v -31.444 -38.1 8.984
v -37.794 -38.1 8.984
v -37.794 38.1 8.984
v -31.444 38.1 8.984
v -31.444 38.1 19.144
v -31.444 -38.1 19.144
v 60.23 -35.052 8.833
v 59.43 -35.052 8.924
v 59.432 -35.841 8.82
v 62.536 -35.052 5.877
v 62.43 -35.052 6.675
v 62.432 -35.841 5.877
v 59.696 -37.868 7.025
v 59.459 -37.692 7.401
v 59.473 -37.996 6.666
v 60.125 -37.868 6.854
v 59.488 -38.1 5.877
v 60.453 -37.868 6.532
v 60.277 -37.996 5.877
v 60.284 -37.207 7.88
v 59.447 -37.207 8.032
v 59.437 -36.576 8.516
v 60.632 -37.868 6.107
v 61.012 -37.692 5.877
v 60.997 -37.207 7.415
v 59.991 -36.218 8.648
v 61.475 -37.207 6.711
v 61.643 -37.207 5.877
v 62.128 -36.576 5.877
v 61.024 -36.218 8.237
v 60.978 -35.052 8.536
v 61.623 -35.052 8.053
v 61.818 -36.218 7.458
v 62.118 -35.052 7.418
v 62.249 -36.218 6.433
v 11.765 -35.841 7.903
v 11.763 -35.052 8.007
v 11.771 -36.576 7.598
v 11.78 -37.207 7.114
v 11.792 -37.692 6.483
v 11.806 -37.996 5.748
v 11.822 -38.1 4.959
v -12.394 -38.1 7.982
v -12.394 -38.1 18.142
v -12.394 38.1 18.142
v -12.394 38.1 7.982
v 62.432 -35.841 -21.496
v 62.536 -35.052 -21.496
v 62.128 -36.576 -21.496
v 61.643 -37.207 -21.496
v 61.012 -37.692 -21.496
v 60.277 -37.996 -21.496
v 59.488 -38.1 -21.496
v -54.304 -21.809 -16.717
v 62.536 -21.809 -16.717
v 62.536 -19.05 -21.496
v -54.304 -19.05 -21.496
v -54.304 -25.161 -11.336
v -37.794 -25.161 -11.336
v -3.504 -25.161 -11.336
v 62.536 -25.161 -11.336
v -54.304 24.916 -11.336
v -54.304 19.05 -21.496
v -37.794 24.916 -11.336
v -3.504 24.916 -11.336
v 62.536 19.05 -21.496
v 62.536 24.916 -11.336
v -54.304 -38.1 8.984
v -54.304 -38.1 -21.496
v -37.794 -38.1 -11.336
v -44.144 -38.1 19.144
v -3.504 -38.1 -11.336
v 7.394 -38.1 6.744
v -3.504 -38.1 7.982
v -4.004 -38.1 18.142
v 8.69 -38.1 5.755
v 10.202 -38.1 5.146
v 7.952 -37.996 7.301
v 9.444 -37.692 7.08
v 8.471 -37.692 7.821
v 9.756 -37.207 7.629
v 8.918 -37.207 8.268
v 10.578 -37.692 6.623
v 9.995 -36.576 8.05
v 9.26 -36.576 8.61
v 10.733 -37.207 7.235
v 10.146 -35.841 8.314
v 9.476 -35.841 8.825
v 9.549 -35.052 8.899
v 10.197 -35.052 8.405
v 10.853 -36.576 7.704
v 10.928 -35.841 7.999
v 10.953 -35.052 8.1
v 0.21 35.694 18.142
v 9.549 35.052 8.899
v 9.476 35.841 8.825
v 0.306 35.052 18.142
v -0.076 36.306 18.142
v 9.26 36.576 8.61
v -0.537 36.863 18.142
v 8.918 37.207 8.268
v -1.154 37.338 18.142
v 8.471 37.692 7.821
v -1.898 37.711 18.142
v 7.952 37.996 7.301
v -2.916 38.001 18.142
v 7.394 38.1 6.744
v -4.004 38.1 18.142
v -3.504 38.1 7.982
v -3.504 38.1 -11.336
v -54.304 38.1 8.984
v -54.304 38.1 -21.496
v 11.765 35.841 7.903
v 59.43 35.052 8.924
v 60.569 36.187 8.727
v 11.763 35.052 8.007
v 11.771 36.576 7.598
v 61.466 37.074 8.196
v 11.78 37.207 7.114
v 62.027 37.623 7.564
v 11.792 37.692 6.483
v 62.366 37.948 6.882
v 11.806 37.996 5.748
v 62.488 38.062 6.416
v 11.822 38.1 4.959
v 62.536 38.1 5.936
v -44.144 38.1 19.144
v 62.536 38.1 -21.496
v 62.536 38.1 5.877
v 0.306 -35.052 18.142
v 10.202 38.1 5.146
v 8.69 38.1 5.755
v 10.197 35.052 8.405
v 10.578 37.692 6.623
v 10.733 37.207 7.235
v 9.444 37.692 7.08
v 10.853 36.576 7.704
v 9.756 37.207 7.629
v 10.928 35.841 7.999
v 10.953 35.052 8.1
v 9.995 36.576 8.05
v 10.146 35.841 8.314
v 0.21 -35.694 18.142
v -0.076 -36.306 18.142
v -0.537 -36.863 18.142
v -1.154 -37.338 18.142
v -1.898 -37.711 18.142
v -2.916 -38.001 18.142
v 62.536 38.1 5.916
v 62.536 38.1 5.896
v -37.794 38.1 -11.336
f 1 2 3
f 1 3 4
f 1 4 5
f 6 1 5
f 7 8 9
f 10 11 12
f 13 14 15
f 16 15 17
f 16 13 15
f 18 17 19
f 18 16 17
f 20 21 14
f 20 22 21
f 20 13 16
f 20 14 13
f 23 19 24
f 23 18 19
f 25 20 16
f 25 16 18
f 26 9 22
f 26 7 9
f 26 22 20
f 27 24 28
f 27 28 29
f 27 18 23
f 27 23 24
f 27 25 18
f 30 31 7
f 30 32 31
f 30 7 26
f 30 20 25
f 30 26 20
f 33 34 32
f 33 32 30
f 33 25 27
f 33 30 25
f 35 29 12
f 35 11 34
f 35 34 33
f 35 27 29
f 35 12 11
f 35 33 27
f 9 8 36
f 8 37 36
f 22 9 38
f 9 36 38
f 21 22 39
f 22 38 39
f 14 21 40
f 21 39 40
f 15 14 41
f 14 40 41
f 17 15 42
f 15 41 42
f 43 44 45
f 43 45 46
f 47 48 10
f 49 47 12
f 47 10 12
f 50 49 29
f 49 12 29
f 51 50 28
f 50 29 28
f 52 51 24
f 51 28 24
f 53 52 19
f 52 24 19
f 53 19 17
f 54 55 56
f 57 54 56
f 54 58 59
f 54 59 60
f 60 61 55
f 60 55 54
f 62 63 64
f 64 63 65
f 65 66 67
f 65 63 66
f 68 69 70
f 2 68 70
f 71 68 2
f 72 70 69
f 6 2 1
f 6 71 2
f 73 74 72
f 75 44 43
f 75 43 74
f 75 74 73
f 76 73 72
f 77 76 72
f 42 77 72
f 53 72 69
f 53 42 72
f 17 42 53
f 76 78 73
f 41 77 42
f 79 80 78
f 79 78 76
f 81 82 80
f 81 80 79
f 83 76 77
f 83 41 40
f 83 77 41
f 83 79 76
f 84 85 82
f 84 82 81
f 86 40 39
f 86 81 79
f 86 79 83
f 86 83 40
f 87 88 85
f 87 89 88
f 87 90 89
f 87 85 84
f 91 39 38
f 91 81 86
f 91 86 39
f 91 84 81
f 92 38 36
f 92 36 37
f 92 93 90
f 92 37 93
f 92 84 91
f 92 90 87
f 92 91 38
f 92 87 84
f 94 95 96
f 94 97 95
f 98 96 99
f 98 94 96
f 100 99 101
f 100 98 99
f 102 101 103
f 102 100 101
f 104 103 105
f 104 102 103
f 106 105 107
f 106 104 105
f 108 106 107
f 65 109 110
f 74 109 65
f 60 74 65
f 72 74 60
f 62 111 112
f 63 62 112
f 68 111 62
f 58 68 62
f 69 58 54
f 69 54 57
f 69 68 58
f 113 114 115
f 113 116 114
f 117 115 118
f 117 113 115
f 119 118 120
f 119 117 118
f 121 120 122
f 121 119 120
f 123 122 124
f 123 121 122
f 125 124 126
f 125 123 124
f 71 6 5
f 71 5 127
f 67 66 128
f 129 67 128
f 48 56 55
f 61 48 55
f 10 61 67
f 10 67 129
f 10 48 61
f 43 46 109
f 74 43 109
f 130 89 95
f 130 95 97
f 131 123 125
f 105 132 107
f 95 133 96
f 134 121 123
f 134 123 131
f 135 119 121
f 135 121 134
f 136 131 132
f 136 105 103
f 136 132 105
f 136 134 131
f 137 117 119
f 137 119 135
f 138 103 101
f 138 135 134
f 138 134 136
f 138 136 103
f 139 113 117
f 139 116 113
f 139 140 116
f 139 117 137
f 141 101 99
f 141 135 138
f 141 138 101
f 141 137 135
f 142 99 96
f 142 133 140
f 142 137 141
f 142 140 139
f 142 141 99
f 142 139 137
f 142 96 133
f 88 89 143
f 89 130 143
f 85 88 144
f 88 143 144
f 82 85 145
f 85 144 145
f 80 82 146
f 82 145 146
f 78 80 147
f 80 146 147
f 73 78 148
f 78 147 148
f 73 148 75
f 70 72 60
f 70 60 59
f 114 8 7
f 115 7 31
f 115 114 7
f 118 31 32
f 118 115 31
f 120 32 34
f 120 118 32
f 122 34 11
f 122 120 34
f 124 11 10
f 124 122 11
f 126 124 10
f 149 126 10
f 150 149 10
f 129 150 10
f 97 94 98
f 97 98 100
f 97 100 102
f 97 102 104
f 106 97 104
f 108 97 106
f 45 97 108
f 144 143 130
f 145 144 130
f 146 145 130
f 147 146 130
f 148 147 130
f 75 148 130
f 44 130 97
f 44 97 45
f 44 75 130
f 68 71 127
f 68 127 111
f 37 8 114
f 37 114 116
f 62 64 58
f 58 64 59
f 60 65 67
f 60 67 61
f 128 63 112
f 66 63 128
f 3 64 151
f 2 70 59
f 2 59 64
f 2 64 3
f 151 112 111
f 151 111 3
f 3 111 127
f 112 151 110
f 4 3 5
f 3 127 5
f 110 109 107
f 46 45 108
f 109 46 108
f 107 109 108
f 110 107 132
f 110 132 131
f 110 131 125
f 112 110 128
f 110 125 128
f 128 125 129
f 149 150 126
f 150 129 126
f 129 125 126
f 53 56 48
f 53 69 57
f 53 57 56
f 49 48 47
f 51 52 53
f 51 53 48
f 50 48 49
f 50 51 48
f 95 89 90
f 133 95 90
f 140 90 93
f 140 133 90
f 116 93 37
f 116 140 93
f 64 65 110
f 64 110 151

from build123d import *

# Parameters (mm, degrees)
F1_DEPTH = 38.1
F2_R     = 3.048
F4_DEPTH = 116.84


with BuildPart() as f1:
    # F0 (on Front) → F1 (new body, symmetric)
    with BuildSketch(Plane.XZ):
        Polygon((0.306206, 7.981648), (10.466206, 7.981648), (0.306206, 18.141648), align=None)
        Polygon((-54.303794, -21.495858), (62.536206, -21.495858), (62.536206, 8.984142), (10.466206, 7.981648), (0.306206, 7.981648), (0.306206, 18.141648), (-12.393794, 18.141648), (-12.393794, 7.981648), (-3.503794, 7.981648), (-3.503794, -11.335858), (-37.793794, -11.335858), (-37.793794, 8.984142), (-31.443794, 8.984142), (-31.443794, 19.144142), (-44.143794, 19.144142), (-54.303794, 8.984142), align=None)
    extrude(amount=F1_DEPTH, both=True)

    # F2
    f2_edges = [f1.edges().sort_by_distance(p)[0] for p in [
        (5.386206, -38.1, 13.061648),
        (36.501206, -38.1, 8.482895),
        (62.536206, -38.1, -6.255858),
        (62.536206, 0, 8.984142),
        (10.466206, 0, 7.981648),
        (36.501206, 38.1, 8.482895),
        (5.386206, 38.1, 13.061648),
    ]]
    fillet(f2_edges, radius=F2_R)

    # F3 (on face) → F4 (cut)
    with BuildSketch(Plane.YZ.offset(62.536206)):
        Polygon((0, -11.335858), (0, -21.495858), (19.05, -21.495858), (24.915879, -11.335858), align=None)
        Polygon((-19.05, -21.495858), (0, -21.495858), (0, -11.335858), (-25.161097, -11.335858), (-21.809316, -16.716583), align=None)
    extrude(amount=-F4_DEPTH, mode=Mode.SUBTRACT)


solid = f1.part
